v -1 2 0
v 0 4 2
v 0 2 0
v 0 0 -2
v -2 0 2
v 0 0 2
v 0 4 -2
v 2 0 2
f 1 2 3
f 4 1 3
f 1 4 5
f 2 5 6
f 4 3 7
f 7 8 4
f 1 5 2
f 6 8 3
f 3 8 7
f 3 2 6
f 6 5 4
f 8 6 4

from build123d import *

# Parameters (mm, degrees)
SKETCH1_W           = 4
SKETCH1_H           = 4
BOSS_EXTRUDE1_DEPTH = 4
CUT_EXTRUDE1_DEPTH  = 2
CUT_EXTRUDE2_DEPTH  = 2
CUT_EXTRUDE3_DEPTH  = 10
CUT_EXTRUDE4_DEPTH  = 10


with BuildPart() as part:
    # Sketch1 → Boss-Extrude1 (new body)
    with BuildSketch(Plane(origin=(0, 0, 0), x_dir=(1, 0, 0), z_dir=(0, 1, 0))):
        Rectangle(SKETCH1_W, SKETCH1_H)
    extrude(amount=BOSS_EXTRUDE1_DEPTH)

    # Sketch2 → Cut-Extrude1 (cut)
    with BuildSketch(Plane.ZY.offset(2)):
        Polygon((2, 4), (-2, 0), (-2, 4), align=None)
    extrude(amount=-CUT_EXTRUDE1_DEPTH, mode=Mode.SUBTRACT)

    # Sketch3 → Cut-Extrude2 (cut)
    with BuildSketch(Plane(origin=(2, 0, 0), x_dir=(0, 0, -1), z_dir=(1, 0, 0))):
        Polygon((-2, 0), (2, 4), (-2, 4), align=None)
    extrude(amount=-CUT_EXTRUDE2_DEPTH, mode=Mode.SUBTRACT)

    # Sketch4 → Cut-Extrude3 (cut)
    with BuildSketch(Plane.XY.offset(2)):
        Polygon((-2, 0), (0, 4), (-2, 4), align=None)
        Polygon((2, 4), (0, 4), (2, 0), align=None)
    extrude(amount=-CUT_EXTRUDE3_DEPTH, mode=Mode.SUBTRACT)

    # Sketch5 → Cut-Extrude4 (cut)
    with BuildSketch(Plane.XZ):
        Polygon((2, 2), (0, -2), (2, -2), align=None)
        Polygon((0, -2), (-2, 2), (-2, -2), align=None)
    extrude(amount=-CUT_EXTRUDE4_DEPTH, mode=Mode.SUBTRACT)


solid = part.part
